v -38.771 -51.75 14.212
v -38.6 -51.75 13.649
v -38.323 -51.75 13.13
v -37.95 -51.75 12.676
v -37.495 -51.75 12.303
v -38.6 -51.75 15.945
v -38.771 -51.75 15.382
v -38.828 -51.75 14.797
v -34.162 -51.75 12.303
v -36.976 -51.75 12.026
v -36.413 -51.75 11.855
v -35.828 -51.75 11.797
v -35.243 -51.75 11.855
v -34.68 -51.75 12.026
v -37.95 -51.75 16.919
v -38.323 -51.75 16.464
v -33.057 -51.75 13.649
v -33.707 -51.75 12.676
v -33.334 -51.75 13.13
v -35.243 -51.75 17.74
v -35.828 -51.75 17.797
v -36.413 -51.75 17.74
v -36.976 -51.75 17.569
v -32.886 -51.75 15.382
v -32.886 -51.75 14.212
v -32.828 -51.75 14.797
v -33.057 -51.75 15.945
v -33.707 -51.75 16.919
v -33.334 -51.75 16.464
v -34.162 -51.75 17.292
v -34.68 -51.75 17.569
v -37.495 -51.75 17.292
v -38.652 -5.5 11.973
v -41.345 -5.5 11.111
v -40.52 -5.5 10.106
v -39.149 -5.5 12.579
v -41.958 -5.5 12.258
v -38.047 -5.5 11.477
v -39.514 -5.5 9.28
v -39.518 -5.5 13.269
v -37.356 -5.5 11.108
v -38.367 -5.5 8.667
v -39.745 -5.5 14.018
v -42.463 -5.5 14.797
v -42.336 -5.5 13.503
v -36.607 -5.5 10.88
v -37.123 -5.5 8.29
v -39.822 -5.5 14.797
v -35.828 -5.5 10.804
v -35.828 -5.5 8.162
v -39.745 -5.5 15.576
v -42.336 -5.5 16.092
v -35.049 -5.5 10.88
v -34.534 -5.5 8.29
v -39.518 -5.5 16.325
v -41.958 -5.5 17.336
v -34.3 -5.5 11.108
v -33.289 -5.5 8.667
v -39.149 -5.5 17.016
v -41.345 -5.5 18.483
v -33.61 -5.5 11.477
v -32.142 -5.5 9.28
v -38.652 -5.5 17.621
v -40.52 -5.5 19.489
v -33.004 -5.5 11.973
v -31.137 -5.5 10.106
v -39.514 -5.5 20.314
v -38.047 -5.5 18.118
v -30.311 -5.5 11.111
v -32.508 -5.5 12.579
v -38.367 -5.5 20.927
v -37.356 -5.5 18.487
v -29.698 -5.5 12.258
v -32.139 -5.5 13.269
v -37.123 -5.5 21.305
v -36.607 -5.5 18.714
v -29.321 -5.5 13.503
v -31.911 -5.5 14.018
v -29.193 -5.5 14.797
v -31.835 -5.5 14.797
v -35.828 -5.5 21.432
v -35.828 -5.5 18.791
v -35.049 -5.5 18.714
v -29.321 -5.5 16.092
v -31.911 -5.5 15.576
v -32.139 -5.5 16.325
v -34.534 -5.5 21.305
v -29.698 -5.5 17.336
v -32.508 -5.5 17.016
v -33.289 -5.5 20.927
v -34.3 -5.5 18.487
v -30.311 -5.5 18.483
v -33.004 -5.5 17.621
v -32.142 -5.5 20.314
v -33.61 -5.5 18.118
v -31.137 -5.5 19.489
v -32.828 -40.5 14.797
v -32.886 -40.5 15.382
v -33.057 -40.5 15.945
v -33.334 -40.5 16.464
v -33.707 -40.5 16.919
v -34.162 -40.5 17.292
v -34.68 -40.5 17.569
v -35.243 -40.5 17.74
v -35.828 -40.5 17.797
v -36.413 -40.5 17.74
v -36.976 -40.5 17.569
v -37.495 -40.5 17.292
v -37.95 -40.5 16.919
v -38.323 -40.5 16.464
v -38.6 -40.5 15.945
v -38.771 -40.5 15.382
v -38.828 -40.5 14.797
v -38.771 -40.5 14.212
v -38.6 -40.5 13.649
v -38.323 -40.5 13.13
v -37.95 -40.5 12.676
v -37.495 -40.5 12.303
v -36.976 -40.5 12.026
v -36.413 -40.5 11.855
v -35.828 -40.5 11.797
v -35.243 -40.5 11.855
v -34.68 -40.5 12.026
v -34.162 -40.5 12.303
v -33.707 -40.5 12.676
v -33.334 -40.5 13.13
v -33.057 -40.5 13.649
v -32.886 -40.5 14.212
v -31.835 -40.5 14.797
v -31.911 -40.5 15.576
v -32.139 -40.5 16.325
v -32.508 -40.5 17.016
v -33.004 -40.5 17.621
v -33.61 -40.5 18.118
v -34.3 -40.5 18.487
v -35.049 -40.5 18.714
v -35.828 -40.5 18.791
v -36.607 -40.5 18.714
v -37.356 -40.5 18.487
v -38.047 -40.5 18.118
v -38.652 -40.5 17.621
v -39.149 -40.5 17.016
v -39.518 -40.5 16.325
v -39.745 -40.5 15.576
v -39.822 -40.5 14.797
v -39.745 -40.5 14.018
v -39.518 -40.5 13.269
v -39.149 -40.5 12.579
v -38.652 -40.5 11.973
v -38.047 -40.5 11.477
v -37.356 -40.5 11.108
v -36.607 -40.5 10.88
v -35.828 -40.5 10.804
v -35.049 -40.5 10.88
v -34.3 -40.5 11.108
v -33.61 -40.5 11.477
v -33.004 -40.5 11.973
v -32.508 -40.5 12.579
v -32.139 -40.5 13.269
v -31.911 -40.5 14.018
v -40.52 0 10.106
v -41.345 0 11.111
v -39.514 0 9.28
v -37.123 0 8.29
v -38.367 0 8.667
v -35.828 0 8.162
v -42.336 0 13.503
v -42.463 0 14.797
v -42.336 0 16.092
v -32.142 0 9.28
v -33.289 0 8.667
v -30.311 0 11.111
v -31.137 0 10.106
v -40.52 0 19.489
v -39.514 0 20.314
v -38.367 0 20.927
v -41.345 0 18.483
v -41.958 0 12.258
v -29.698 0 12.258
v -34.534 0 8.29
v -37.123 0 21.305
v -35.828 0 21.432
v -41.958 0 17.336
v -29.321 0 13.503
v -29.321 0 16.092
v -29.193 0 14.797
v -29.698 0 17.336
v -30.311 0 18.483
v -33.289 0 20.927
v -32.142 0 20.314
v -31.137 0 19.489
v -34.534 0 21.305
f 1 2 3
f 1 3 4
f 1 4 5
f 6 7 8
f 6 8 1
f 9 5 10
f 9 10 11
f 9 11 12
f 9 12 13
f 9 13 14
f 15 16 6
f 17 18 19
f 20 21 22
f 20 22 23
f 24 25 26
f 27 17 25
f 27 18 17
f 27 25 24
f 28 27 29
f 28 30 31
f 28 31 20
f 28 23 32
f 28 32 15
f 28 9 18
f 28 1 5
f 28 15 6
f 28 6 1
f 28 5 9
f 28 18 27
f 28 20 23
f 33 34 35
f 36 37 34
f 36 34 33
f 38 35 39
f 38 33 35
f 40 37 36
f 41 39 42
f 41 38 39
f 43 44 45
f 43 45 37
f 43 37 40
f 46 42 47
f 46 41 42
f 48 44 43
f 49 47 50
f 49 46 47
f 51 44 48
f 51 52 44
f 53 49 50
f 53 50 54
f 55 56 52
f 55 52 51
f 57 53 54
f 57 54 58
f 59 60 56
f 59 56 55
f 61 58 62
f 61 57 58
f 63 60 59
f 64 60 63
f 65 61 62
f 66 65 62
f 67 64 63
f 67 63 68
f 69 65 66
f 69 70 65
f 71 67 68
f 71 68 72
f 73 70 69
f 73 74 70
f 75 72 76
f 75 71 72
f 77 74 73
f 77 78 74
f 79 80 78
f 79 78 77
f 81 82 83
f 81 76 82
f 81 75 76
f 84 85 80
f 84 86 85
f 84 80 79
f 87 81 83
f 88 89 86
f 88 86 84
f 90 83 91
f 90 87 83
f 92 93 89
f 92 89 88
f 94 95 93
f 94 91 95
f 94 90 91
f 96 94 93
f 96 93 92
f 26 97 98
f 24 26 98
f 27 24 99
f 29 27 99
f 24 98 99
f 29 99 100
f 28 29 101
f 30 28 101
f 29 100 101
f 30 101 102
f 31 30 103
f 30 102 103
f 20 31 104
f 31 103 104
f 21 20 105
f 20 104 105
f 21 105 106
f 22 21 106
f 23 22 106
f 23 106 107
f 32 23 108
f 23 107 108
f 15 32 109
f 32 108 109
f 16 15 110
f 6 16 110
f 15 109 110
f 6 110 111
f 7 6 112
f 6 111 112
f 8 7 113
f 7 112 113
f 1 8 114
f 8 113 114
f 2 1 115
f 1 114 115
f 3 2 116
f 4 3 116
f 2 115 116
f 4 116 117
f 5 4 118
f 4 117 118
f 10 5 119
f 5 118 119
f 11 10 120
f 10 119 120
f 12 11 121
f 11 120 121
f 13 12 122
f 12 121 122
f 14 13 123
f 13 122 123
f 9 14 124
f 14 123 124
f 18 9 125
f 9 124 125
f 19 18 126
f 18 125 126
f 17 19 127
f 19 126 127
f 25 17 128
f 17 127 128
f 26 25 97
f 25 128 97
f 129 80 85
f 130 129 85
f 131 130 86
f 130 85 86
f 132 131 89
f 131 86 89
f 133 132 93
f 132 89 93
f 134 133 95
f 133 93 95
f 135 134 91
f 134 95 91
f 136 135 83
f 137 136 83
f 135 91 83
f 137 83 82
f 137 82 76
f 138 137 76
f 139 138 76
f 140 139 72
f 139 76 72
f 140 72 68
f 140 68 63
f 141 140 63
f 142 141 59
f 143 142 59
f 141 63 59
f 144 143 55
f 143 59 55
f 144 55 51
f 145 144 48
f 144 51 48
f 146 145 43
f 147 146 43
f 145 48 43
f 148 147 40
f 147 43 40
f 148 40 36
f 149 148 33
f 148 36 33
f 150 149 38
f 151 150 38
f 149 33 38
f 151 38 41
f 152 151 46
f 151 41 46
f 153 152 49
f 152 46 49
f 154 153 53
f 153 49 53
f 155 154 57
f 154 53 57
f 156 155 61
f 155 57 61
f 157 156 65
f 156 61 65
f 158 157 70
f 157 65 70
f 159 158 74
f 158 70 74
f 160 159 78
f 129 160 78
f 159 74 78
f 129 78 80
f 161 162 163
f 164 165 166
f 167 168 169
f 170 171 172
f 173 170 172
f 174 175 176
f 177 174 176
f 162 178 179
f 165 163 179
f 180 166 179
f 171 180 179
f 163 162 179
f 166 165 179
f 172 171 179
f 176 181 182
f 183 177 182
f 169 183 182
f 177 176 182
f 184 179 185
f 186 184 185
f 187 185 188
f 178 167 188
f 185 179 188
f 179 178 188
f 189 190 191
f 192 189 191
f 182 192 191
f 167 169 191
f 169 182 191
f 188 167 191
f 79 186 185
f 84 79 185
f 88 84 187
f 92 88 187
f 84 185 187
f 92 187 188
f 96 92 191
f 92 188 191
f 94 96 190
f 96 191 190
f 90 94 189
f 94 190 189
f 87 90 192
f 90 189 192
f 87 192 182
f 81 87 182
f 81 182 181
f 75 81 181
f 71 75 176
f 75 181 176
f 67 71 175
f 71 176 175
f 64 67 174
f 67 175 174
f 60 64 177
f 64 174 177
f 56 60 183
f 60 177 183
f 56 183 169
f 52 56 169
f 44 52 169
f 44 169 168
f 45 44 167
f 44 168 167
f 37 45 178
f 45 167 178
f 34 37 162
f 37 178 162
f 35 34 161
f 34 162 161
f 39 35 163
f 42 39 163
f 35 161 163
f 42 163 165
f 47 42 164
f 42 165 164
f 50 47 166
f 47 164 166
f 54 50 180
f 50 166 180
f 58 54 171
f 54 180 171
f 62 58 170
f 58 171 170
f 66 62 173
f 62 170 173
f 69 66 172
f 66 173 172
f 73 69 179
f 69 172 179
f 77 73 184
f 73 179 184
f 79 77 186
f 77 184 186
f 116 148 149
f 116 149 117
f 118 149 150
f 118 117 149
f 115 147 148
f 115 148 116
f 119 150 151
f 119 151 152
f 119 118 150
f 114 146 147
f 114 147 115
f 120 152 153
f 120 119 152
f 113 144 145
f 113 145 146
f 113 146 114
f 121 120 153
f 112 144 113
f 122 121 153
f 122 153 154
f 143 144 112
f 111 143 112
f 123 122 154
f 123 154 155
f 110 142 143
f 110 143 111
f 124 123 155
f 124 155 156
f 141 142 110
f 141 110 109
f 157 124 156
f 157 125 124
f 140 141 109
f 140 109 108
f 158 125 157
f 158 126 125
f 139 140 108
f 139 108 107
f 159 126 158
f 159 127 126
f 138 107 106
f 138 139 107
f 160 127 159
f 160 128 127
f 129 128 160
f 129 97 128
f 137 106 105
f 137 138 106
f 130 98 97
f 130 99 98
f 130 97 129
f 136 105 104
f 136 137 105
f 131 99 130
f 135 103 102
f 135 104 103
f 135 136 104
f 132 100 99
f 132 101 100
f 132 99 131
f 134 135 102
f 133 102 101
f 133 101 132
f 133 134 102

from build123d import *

# Parameters (mm, degrees)
F0_R     = 6.635
F1_DEPTH = 5.5
F2_R     = 3.9935
F3_DEPTH = 35
F4_R     = 3
F5_DEPTH = 11.25


with BuildPart() as f1:
    # F0 (on Front) → F1 (new body)
    with BuildSketch(Plane.XZ):
        with Locations((-35.828222, 14.797199)):
            Circle(F0_R)
    extrude(amount=F1_DEPTH)

    # F2 (on face) → F3 (join)
    with BuildSketch(Plane.XZ.offset(5.5)):
        with Locations((-35.828222, 14.797199)):
            Circle(F2_R)
    extrude(amount=F3_DEPTH)

    # F4 (on face) → F5 (join)
    with BuildSketch(Plane.XZ.offset(40.5)):
        with Locations((-35.828222, 14.797199)):
            Circle(F4_R)
    extrude(amount=F5_DEPTH)


solid = f1.part
